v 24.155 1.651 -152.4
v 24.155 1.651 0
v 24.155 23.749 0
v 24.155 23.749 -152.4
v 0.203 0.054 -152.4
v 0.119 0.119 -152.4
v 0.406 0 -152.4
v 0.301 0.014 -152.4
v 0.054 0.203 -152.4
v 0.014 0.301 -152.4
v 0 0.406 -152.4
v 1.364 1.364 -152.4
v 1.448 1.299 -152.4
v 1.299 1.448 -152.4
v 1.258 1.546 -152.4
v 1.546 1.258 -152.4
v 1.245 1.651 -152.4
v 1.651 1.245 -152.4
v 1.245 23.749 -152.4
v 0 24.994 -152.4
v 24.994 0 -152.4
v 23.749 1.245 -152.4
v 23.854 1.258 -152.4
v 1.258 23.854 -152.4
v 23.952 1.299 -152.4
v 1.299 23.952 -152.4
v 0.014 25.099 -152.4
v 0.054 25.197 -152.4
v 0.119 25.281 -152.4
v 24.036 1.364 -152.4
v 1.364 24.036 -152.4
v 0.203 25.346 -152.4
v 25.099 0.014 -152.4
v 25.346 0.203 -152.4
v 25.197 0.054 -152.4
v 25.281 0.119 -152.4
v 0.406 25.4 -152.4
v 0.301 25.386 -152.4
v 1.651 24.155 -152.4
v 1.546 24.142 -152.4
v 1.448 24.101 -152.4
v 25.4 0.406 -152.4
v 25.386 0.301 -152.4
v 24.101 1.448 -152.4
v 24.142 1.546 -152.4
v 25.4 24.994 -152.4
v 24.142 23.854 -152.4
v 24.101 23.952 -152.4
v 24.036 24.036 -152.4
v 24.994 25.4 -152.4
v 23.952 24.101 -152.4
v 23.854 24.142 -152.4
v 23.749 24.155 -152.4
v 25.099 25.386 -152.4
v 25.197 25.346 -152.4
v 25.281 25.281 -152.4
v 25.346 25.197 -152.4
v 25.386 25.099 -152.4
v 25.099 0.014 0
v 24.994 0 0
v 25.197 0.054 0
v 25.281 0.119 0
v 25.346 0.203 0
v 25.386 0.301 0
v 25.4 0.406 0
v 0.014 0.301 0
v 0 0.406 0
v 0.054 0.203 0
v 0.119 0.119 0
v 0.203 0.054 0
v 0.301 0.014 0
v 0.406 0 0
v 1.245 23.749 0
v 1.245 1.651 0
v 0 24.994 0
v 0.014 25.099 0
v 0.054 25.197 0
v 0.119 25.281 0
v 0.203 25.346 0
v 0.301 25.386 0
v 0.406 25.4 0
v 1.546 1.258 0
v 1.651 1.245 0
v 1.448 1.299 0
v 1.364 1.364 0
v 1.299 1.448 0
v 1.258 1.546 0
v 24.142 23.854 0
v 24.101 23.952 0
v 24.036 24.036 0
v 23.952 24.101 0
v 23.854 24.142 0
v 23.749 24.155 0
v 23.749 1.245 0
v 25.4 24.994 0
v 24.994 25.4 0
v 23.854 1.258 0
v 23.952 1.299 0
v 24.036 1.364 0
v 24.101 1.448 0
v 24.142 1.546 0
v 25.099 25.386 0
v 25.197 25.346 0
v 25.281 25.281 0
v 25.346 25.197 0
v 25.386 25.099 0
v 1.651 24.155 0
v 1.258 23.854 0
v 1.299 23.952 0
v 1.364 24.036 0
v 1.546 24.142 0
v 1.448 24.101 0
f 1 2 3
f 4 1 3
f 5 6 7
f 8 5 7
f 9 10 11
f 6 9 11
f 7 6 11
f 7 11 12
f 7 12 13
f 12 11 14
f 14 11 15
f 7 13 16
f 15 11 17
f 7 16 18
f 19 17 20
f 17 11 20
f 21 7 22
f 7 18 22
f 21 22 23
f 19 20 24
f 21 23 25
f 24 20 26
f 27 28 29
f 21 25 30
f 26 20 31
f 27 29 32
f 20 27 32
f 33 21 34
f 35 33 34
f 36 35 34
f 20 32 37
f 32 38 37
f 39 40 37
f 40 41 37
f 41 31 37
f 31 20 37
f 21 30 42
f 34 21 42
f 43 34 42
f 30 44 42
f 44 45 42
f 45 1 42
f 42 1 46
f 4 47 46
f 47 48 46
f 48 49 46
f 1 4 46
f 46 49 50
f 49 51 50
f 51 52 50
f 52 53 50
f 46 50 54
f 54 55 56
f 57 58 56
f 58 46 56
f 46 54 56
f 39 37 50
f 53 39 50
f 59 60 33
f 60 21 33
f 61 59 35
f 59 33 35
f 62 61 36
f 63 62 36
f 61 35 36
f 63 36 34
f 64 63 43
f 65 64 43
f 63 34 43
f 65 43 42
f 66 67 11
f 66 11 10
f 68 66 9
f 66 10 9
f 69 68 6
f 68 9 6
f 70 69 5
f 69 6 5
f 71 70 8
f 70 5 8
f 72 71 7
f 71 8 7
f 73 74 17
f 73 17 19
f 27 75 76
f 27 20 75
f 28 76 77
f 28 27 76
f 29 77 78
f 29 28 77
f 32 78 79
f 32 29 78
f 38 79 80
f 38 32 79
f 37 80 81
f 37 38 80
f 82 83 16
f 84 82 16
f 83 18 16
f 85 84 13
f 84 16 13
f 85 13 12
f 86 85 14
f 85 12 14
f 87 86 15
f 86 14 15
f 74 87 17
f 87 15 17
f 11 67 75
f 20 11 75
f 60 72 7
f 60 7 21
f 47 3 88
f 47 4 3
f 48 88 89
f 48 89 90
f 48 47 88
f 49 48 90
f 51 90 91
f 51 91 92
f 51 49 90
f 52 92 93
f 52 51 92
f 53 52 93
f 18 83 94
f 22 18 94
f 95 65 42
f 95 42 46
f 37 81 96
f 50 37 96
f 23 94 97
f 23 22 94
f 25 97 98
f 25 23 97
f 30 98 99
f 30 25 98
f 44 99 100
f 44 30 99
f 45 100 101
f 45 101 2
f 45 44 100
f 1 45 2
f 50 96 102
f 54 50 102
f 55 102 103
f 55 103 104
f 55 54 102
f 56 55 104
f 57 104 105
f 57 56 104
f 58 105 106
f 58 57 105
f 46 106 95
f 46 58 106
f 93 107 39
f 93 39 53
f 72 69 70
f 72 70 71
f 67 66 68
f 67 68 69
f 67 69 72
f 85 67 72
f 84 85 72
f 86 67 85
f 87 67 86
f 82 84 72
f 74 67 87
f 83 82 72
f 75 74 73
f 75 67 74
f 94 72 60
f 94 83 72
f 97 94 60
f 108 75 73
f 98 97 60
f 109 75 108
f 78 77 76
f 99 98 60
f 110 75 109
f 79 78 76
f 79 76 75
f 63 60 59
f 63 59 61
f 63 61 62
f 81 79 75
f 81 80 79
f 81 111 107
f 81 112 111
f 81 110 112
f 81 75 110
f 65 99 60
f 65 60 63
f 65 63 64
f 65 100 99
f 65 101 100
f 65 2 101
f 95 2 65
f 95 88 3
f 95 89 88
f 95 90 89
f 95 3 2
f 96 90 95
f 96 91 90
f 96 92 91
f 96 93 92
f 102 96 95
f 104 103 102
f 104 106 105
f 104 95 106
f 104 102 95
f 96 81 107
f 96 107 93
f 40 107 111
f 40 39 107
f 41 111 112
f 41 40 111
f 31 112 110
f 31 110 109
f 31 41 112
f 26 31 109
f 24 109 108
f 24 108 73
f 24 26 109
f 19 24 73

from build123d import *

# Parameters (mm, degrees)
SKETCH1_W           = 25.4
SKETCH1_H           = 25.4
SKETCH1_W_2         = 22.9108
SKETCH1_H_2         = 22.9108
BOSS_EXTRUDE1_DEPTH = 152.4
FILLET1_R           = 0.4064
FILLET2_R           = 0.4064


with BuildPart() as part:
    # Sketch1 → Boss-Extrude1 (new body)
    with BuildSketch(Plane.XY):
        with Locations((12.7, 12.7)):
            Rectangle(SKETCH1_W, SKETCH1_H)
        with Locations((12.7, 12.7)):
            Rectangle(SKETCH1_W_2, SKETCH1_H_2, mode=Mode.SUBTRACT)
    extrude(amount=-BOSS_EXTRUDE1_DEPTH)

    # Fillet1
    fillet1_edges = [part.edges().sort_by_distance(p)[0] for p in [
        (0, 25.4, -76.2),
        (25.4, 25.4, -76.2),
        (25.4, 0, -76.2),
        (0, 0, -76.2),
    ]]
    fillet(fillet1_edges, radius=FILLET1_R)

    # Fillet2
    fillet2_edges = [part.edges().sort_by_distance(p)[0] for p in [
        (1.2446, 1.2446, -76.2),
        (1.2446, 24.1554, -76.2),
        (24.1554, 24.1554, -76.2),
        (24.1554, 1.2446, -76.2),
    ]]
    fillet(fillet2_edges, radius=FILLET2_R)


solid = part.part
